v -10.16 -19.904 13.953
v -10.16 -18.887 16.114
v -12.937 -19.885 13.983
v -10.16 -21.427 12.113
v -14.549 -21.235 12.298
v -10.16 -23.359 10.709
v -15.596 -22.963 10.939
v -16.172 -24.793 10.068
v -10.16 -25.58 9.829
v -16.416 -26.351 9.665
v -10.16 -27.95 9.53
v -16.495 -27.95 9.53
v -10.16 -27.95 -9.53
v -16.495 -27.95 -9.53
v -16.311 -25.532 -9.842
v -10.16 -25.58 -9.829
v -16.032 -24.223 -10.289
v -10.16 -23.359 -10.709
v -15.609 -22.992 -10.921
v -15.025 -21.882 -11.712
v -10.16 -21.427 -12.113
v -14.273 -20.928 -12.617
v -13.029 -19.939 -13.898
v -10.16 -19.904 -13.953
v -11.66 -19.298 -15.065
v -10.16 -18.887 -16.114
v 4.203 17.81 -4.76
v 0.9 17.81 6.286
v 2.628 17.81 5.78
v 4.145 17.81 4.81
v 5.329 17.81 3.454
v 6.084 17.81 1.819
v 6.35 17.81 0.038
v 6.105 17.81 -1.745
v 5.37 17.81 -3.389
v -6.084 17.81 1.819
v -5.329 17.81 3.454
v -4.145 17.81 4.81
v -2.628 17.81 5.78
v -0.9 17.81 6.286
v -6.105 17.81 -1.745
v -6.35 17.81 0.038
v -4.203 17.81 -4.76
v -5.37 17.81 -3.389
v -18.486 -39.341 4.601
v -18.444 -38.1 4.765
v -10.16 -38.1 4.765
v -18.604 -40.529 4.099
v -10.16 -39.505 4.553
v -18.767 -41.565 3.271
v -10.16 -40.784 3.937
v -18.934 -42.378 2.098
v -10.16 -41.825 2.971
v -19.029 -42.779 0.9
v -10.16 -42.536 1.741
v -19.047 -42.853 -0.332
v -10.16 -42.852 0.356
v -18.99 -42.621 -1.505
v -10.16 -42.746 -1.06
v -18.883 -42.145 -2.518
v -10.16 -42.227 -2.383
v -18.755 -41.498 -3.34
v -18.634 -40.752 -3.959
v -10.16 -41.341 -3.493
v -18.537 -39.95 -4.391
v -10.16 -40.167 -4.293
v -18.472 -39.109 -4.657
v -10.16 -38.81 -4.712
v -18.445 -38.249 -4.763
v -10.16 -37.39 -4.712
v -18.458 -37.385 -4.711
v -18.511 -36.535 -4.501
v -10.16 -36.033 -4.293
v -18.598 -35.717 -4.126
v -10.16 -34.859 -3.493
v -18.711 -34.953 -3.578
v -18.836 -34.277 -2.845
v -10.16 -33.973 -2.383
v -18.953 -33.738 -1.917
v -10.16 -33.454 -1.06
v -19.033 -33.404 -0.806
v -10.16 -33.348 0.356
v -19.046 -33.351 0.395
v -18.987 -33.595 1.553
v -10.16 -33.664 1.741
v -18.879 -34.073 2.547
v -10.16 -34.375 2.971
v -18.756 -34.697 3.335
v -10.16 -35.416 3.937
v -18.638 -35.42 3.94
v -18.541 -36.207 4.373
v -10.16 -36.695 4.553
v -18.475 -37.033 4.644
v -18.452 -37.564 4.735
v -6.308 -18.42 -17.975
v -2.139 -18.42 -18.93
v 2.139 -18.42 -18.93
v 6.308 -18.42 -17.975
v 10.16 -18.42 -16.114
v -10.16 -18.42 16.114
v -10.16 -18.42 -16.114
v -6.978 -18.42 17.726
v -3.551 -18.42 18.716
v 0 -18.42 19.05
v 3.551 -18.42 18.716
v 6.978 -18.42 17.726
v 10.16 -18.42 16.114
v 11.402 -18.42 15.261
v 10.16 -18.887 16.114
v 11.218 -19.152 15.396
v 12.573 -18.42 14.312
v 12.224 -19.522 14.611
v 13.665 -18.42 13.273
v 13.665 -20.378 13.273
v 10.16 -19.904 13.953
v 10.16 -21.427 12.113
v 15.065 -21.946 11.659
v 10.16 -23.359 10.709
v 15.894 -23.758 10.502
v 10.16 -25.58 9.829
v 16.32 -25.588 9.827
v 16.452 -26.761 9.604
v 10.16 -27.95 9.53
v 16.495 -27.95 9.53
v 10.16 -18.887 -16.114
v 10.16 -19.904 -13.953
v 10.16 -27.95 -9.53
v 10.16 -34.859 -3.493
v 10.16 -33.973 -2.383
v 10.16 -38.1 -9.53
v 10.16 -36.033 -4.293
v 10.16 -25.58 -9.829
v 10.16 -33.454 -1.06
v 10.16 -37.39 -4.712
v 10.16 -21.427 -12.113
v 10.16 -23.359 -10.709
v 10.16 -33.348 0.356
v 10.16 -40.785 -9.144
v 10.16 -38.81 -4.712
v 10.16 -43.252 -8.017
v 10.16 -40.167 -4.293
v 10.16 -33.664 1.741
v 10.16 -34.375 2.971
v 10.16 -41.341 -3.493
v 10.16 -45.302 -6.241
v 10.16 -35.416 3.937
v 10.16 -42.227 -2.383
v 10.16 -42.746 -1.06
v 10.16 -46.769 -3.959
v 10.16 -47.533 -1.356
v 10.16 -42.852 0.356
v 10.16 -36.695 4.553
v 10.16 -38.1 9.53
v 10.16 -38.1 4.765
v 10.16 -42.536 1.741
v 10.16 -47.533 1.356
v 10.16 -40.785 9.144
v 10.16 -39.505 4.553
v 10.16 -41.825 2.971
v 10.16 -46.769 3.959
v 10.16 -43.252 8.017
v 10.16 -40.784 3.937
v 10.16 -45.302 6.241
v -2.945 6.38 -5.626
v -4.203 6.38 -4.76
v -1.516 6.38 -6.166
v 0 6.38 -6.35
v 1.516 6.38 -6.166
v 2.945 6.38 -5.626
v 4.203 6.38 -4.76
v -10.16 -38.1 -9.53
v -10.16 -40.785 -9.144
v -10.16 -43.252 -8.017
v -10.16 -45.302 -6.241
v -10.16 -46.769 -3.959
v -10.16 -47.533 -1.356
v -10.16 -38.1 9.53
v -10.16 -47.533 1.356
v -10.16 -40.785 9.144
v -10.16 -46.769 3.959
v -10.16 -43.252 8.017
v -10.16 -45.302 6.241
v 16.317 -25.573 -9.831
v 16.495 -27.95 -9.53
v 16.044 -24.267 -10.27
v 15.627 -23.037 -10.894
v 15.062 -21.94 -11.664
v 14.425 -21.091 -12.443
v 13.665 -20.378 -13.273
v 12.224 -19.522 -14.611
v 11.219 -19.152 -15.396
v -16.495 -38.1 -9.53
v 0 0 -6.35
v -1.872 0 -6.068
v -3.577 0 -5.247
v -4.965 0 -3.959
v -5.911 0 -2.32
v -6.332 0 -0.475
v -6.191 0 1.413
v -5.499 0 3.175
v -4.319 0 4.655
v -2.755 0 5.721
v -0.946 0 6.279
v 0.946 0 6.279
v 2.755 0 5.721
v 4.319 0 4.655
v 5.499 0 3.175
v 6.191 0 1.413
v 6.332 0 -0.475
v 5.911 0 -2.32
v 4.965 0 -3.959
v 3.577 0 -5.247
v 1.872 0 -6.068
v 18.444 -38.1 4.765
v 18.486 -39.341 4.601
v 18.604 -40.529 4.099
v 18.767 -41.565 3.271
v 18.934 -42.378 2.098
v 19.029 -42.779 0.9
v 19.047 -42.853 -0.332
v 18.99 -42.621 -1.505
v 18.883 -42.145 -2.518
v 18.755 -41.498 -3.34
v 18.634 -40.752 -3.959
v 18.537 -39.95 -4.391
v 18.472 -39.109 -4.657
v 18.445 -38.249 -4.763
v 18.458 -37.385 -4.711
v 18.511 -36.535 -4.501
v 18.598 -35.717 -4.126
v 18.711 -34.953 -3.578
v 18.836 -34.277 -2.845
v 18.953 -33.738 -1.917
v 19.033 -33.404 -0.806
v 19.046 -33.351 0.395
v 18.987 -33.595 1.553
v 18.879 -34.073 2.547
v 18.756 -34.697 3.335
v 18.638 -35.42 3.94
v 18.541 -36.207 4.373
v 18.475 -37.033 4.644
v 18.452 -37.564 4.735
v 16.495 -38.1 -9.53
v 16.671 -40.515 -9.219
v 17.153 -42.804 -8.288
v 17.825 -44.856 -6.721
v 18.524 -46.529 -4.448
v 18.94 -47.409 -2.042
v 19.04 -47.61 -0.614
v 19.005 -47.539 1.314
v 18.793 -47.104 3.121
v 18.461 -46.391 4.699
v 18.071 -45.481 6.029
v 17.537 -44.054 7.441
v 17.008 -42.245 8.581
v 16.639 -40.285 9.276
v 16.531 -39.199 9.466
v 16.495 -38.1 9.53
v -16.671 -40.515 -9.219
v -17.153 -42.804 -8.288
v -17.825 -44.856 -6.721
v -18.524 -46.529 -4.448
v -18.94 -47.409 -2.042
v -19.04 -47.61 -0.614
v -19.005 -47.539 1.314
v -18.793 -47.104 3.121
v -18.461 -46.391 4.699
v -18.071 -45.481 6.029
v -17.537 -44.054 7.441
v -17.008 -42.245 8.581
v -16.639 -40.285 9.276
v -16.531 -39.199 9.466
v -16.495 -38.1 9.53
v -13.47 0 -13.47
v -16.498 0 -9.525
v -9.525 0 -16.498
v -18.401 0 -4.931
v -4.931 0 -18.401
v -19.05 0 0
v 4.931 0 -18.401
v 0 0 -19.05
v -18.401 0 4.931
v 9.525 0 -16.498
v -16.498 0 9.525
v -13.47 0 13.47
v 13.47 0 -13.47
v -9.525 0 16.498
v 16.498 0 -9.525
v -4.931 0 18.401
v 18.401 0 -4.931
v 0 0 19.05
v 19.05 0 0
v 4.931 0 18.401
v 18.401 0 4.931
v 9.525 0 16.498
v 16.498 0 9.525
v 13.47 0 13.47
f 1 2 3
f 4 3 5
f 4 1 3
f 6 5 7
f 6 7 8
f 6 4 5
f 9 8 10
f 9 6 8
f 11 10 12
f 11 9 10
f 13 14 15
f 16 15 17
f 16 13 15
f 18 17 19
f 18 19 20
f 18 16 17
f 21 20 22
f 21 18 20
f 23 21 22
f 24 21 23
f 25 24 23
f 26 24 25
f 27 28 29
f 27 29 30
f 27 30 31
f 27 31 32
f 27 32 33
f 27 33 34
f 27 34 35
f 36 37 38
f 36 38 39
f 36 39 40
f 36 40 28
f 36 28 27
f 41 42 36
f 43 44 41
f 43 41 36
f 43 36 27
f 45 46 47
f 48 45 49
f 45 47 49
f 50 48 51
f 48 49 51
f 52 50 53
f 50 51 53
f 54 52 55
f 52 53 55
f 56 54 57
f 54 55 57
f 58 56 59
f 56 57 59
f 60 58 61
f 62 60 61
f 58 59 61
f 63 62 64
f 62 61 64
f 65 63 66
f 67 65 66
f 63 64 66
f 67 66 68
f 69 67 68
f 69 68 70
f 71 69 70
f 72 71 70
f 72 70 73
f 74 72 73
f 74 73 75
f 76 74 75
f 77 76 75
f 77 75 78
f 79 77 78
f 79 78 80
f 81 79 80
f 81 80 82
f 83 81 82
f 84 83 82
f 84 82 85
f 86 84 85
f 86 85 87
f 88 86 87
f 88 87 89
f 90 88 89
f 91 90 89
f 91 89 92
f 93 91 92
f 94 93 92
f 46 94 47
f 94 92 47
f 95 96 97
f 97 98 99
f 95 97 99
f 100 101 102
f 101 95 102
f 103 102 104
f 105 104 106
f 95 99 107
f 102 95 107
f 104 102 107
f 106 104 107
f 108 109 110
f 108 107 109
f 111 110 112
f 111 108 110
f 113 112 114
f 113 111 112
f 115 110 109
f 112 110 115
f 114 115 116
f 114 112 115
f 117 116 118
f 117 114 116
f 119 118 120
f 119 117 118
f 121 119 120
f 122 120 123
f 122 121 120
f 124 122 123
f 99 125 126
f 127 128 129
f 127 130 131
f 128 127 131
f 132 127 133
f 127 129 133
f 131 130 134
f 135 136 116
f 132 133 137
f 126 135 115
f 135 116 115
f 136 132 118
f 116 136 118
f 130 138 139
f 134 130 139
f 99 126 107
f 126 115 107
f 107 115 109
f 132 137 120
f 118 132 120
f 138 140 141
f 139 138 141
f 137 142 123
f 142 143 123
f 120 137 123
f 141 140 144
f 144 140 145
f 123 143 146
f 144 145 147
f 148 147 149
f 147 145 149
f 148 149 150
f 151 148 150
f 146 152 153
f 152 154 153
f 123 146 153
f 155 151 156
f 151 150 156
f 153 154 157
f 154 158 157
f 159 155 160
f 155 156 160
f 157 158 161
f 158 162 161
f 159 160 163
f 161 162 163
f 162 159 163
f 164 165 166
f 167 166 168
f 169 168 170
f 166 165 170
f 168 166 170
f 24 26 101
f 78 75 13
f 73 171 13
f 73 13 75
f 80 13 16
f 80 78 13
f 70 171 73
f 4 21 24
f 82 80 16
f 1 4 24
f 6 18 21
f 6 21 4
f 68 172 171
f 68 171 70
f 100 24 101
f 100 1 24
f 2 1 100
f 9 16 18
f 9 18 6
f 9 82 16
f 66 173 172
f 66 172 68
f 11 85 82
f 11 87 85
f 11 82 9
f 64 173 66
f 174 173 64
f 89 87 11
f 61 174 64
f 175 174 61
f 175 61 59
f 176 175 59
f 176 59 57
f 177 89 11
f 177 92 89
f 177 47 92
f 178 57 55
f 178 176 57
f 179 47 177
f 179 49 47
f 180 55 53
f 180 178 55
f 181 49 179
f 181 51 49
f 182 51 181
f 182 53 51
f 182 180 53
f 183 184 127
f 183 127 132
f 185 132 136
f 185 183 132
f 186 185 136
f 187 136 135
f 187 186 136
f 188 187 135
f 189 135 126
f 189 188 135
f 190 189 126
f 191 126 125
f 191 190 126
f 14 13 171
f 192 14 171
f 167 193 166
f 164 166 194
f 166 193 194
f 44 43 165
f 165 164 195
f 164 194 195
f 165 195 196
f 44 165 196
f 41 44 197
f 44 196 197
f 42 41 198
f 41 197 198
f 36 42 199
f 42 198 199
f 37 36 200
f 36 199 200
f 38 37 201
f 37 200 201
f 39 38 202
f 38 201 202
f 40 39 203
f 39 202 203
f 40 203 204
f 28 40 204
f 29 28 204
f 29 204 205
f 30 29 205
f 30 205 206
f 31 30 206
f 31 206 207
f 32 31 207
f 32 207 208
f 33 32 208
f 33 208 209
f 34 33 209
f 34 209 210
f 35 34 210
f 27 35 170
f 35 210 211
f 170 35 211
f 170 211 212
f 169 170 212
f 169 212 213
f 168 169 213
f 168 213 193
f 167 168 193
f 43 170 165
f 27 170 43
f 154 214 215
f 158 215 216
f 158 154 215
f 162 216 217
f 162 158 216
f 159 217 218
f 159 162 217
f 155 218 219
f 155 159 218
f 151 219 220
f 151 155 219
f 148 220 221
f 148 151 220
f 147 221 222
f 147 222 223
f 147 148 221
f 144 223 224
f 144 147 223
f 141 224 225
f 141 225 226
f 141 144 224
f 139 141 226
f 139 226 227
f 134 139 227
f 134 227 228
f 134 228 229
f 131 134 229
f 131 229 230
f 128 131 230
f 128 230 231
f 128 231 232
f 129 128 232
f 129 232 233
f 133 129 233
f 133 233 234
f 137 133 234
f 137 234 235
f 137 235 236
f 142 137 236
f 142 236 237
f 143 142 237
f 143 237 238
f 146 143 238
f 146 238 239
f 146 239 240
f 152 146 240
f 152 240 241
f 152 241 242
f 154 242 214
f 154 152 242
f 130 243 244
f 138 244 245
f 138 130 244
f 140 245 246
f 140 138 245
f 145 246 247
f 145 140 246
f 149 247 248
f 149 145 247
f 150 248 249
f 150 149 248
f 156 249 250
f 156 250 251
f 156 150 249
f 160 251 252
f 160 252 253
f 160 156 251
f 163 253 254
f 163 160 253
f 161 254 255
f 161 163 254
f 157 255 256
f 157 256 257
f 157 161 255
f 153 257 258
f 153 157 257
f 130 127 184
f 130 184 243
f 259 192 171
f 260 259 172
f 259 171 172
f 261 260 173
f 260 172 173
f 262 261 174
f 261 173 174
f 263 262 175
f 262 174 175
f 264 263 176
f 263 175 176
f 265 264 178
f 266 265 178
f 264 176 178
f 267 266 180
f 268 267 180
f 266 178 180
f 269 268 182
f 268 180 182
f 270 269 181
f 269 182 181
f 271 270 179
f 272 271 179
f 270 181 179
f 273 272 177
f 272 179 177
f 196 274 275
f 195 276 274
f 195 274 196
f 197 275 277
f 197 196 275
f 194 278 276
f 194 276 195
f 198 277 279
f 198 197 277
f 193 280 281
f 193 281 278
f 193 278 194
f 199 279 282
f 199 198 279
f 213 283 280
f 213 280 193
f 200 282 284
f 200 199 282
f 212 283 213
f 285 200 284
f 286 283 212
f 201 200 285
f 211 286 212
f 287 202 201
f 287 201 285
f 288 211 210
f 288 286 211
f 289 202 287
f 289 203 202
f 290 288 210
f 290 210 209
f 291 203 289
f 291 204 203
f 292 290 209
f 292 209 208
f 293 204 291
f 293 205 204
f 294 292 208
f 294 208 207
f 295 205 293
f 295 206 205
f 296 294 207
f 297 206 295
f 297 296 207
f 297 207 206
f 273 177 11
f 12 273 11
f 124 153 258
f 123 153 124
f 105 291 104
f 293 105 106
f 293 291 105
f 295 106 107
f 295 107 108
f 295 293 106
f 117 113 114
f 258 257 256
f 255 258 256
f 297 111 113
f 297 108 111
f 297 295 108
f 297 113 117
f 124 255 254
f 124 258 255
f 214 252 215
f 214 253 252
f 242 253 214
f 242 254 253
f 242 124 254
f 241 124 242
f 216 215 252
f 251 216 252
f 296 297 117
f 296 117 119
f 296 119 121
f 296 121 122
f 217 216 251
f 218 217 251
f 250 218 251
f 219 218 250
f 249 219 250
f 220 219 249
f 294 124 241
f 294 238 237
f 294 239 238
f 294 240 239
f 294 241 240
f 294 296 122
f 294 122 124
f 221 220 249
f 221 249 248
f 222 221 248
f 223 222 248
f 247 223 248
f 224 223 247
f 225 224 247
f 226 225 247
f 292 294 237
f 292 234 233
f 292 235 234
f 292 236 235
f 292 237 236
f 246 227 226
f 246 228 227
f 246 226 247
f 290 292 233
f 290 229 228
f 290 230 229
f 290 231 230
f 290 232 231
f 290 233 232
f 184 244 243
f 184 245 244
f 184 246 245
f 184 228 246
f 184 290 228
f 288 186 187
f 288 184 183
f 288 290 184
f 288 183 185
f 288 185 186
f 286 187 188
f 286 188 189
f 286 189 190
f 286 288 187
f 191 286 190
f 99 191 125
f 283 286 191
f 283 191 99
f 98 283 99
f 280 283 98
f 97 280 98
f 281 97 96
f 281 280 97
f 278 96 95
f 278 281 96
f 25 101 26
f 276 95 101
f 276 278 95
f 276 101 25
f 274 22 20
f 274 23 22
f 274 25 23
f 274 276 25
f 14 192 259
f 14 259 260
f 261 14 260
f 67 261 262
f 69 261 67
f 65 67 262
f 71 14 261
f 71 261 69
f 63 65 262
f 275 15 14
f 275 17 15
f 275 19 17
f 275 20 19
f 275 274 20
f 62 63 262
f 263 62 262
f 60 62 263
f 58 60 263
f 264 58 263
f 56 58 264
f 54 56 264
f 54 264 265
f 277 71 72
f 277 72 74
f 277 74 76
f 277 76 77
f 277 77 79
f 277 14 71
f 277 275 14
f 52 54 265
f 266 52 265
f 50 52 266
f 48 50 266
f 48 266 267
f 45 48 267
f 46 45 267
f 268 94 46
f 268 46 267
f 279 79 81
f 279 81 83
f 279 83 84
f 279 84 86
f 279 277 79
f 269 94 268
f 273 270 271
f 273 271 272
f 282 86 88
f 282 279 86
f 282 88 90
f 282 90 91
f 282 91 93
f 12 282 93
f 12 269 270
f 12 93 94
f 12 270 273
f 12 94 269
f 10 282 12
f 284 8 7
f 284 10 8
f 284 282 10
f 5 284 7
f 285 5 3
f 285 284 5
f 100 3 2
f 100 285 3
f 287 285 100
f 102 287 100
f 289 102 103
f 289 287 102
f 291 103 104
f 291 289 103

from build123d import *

# Parameters (mm, degrees)
IZIM2_R                          = 19.05
Y_KSEKLIK_EKSTR_ZYON2_DEPTH      = 18.42
Y_KSEKLIK_EKSTR_ZYON4_REACH      = 41.439
Y_KSEKLIK_EKSTR_ZYON4_END_RADIUS = 19.05
IZIM3_R                          = 4.765
RADYUS1_R                        = 9.53
IZIM5_R                          = 6.35
Y_KSEKLIK_EKSTR_ZYON5_DEPTH      = 17.81
IZIM6_W                          = 1.59
IZIM6_H                          = 11.43
KES_EKSTR_ZYON2_DEPTH            = 8.905


with BuildPart() as part:
    # Çizim2 → Yükseklik-Ekstrüzyon2 (new body)
    with BuildSketch(Plane(origin=(0, 0, 0), x_dir=(1, 0, 0), z_dir=(0, 1, 0))):
        with Locations(Location((0, 0, 0), (0, 0, 270))):
            Circle(IZIM2_R)
    extrude(amount=-Y_KSEKLIK_EKSTR_ZYON2_DEPTH)

    # Yükseklik-Ekstrüzyon4: up to this cylinder (the profile starts inside it)
    y_kseklik_ekstr_zyon4_end = Plane(origin=(0, -31.124737, 0), z_dir=(0, 1, 0)) * Cylinder(Y_KSEKLIK_EKSTR_ZYON4_END_RADIUS, 121.978, mode=Mode.PRIVATE)
    # Çizim3 → Yükseklik-Ekstrüzyon4 (add, up to the surface)
    with BuildSketch(Plane(origin=(10.16, 0, 0), x_dir=(0, 0, -1), z_dir=(1, 0, 0)), mode=Mode.PRIVATE) as y_kseklik_ekstr_zyon4_sk1:
        with BuildLine():
            Line((-9.53, -38.1), (-9.53, -18.42))
            Line((-9.53, -18.42), (9.53, -18.42))
            Line((9.53, -18.42), (9.53, -38.1))
            ThreePointArc((9.53, -38.1), (0, -47.63), (-9.53, -38.1))
        make_face()
        with Locations(Location((0, -38.1, 0), (0, 0, 180))):
            Circle(IZIM3_R, mode=Mode.SUBTRACT)
    y_kseklik_ekstr_zyon4_tool1 = extrude(y_kseklik_ekstr_zyon4_sk1.sketch, amount=Y_KSEKLIK_EKSTR_ZYON4_REACH, mode=Mode.PRIVATE) & y_kseklik_ekstr_zyon4_end
    y_kseklik_ekstr_zyon4 = y_kseklik_ekstr_zyon4_tool1.solids().sort_by_distance((10.16, -31.124737, 0))[0]
    add(y_kseklik_ekstr_zyon4)

    # Aynalama3: Yükseklik-Ekstrüzyon4 across plane
    add(y_kseklik_ekstr_zyon4.mirror(Plane(origin=(0, 0, 0), x_dir=(0, 0, 1), z_dir=(1, 0, 0))))

    # Radyus1
    # the kernel refuses this fillet: 9.53 mm, written as the material it adds along each edge
    with BuildSketch(Plane(origin=(13.665, -18.42, 9.53), x_dir=(0, 0, 1), z_dir=(-1, 0, 0))) as radyus1_piece_1_section:
        with BuildLine():
            CenterArc((RADYUS1_R, -RADYUS1_R), RADYUS1_R, 90, 90)
            Line((0, -RADYUS1_R), (0, 0))
            Line((0, 0), (RADYUS1_R, 0))
        make_face()
    radyus1_piece_1 = extrude(amount=53.98489618, mode=Mode.PRIVATE)
    radyus1_piece_1 = radyus1_piece_1 & Plane(origin=(0, -20.798311962, 0), x_dir=(0, 0, 1), z_dir=(0, 1, 0)) * Cylinder(19.05, 147, mode=Mode.PRIVATE)
    radyus1_piece_1 = split(radyus1_piece_1, bisect_by=Plane(origin=(10.16, -20.798311962, 11.199892809), z_dir=(1, 0, 0)), keep=Keep.TOP, mode=Mode.PRIVATE)
    add(radyus1_piece_1)
    with BuildSketch(Plane(origin=(-10.16, -18.42, 9.53), x_dir=(0, 0, 1), z_dir=(-1, 0, 0))) as radyus1_piece_2_section:
        with BuildLine():
            CenterArc((RADYUS1_R, -RADYUS1_R), RADYUS1_R, 90, 90)
            Line((0, -RADYUS1_R), (0, 0))
            Line((0, 0), (RADYUS1_R, 0))
        make_face()
    radyus1_piece_2 = extrude(amount=30.15989618, mode=Mode.PRIVATE)
    radyus1_piece_2 = radyus1_piece_2 & Plane(origin=(0, -21.011864307, 0), x_dir=(0, 0, 1), z_dir=(0, 1, 0)) * Cylinder(19.05, 99, mode=Mode.PRIVATE)
    add(radyus1_piece_2)
    with BuildSketch(Plane(origin=(13.665, -18.42, -9.53), x_dir=(0, 0, -1), z_dir=(-1, 0, 0))) as radyus1_piece_3_section:
        with BuildLine():
            CenterArc((RADYUS1_R, RADYUS1_R), RADYUS1_R, 180, 90)
            Line((0, RADYUS1_R), (0, 0))
            Line((0, 0), (RADYUS1_R, 0))
        make_face()
    radyus1_piece_3 = extrude(amount=53.98489618, mode=Mode.PRIVATE)
    radyus1_piece_3 = radyus1_piece_3 & Plane(origin=(0, -20.798311941, 0), x_dir=(0, 0, 1), z_dir=(0, 1, 0)) * Cylinder(19.05, 147, mode=Mode.PRIVATE)
    radyus1_piece_3 = split(radyus1_piece_3, bisect_by=Plane(origin=(10.16, -20.798311941, -11.199892873), z_dir=(1, 0, 0)), keep=Keep.TOP, mode=Mode.PRIVATE)
    add(radyus1_piece_3)
    with BuildSketch(Plane(origin=(-10.16, -18.42, -9.53), x_dir=(0, 0, -1), z_dir=(-1, 0, 0))) as radyus1_piece_4_section:
        with BuildLine():
            CenterArc((RADYUS1_R, RADYUS1_R), RADYUS1_R, 180, 90)
            Line((0, RADYUS1_R), (0, 0))
            Line((0, 0), (RADYUS1_R, 0))
        make_face()
    radyus1_piece_4 = extrude(amount=30.15989618, mode=Mode.PRIVATE)
    radyus1_piece_4 = radyus1_piece_4 & Plane(origin=(0, -21.011867626, 0), x_dir=(0, 0, 1), z_dir=(0, 1, 0)) * Cylinder(19.05, 99, mode=Mode.PRIVATE)
    add(radyus1_piece_4)
    with BuildSketch(Plane(origin=(-13.665, -18.42, 9.53), x_dir=(0, 0, 1), z_dir=(1, 0, 0))) as radyus1_piece_5_section:
        with BuildLine():
            CenterArc((RADYUS1_R, RADYUS1_R), RADYUS1_R, 180, 90)
            Line((0, RADYUS1_R), (0, 0))
            Line((0, 0), (RADYUS1_R, 0))
        make_face()
    radyus1_piece_5 = extrude(amount=53.98489618, mode=Mode.PRIVATE)
    radyus1_piece_5 = radyus1_piece_5 & Plane(origin=(0, -20.798312003, 0), x_dir=(0, 0, 1), z_dir=(0, 1, 0)) * Cylinder(19.05, 147, mode=Mode.PRIVATE)
    radyus1_piece_5 = split(radyus1_piece_5, bisect_by=Plane(origin=(-10.16, -20.798312003, 11.199892685), z_dir=(-1, 0, 0)), keep=Keep.TOP, mode=Mode.PRIVATE)
    add(radyus1_piece_5)
    with BuildSketch(Plane(origin=(10.16, -18.42, 9.53), x_dir=(0, 0, 1), z_dir=(1, 0, 0))) as radyus1_piece_6_section:
        with BuildLine():
            CenterArc((RADYUS1_R, RADYUS1_R), RADYUS1_R, 180, 90)
            Line((0, RADYUS1_R), (0, 0))
            Line((0, 0), (RADYUS1_R, 0))
        make_face()
    radyus1_piece_6 = extrude(amount=30.15989618, mode=Mode.PRIVATE)
    radyus1_piece_6 = radyus1_piece_6 & Plane(origin=(0, -21.011867621, 0), x_dir=(0, 0, 1), z_dir=(0, 1, 0)) * Cylinder(19.05, 99, mode=Mode.PRIVATE)
    add(radyus1_piece_6)
    with BuildSketch(Plane(origin=(-13.665, -18.42, -9.53), x_dir=(0, 0, -1), z_dir=(1, 0, 0))) as radyus1_piece_7_section:
        with BuildLine():
            CenterArc((RADYUS1_R, -RADYUS1_R), RADYUS1_R, 90, 90)
            Line((0, -RADYUS1_R), (0, 0))
            Line((0, 0), (RADYUS1_R, 0))
        make_face()
    radyus1_piece_7 = extrude(amount=53.98489618, mode=Mode.PRIVATE)
    radyus1_piece_7 = radyus1_piece_7 & Plane(origin=(0, -20.798311958, 0), x_dir=(0, 0, 1), z_dir=(0, 1, 0)) * Cylinder(19.05, 147, mode=Mode.PRIVATE)
    radyus1_piece_7 = split(radyus1_piece_7, bisect_by=Plane(origin=(-10.16, -20.798311958, -11.199892821), z_dir=(-1, 0, 0)), keep=Keep.TOP, mode=Mode.PRIVATE)
    add(radyus1_piece_7)
    with BuildSketch(Plane(origin=(10.16, -18.42, -9.53), x_dir=(0, 0, -1), z_dir=(1, 0, 0))) as radyus1_piece_8_section:
        with BuildLine():
            CenterArc((RADYUS1_R, -RADYUS1_R), RADYUS1_R, 90, 90)
            Line((0, -RADYUS1_R), (0, 0))
            Line((0, 0), (RADYUS1_R, 0))
        make_face()
    radyus1_piece_8 = extrude(amount=30.15989618, mode=Mode.PRIVATE)
    radyus1_piece_8 = radyus1_piece_8 & Plane(origin=(0, -21.011864338, 0), x_dir=(0, 0, 1), z_dir=(0, 1, 0)) * Cylinder(19.05, 99, mode=Mode.PRIVATE)
    add(radyus1_piece_8)

    # Çizim5 → Yükseklik-Ekstrüzyon5 (add)
    with BuildSketch(Plane(origin=(0, 0, 0), x_dir=(1, 0, 0), z_dir=(0, 1, 0))):
        with Locations(Location((0, 0, 0), (0, 0, 90))):
            Circle(IZIM5_R)
    extrude(amount=Y_KSEKLIK_EKSTR_ZYON5_DEPTH)

    # Çizim6 → Kes-Ekstrüzyon2 (cut, symmetric)
    with BuildSketch(Plane(origin=(0, 0, 0), x_dir=(0, 0, -1), z_dir=(1, 0, 0))):
        with Locations((5.555, 12.095)):
            Rectangle(IZIM6_W, IZIM6_H)
    extrude(amount=KES_EKSTR_ZYON2_DEPTH, both=True, mode=Mode.SUBTRACT)


solid = part.part
